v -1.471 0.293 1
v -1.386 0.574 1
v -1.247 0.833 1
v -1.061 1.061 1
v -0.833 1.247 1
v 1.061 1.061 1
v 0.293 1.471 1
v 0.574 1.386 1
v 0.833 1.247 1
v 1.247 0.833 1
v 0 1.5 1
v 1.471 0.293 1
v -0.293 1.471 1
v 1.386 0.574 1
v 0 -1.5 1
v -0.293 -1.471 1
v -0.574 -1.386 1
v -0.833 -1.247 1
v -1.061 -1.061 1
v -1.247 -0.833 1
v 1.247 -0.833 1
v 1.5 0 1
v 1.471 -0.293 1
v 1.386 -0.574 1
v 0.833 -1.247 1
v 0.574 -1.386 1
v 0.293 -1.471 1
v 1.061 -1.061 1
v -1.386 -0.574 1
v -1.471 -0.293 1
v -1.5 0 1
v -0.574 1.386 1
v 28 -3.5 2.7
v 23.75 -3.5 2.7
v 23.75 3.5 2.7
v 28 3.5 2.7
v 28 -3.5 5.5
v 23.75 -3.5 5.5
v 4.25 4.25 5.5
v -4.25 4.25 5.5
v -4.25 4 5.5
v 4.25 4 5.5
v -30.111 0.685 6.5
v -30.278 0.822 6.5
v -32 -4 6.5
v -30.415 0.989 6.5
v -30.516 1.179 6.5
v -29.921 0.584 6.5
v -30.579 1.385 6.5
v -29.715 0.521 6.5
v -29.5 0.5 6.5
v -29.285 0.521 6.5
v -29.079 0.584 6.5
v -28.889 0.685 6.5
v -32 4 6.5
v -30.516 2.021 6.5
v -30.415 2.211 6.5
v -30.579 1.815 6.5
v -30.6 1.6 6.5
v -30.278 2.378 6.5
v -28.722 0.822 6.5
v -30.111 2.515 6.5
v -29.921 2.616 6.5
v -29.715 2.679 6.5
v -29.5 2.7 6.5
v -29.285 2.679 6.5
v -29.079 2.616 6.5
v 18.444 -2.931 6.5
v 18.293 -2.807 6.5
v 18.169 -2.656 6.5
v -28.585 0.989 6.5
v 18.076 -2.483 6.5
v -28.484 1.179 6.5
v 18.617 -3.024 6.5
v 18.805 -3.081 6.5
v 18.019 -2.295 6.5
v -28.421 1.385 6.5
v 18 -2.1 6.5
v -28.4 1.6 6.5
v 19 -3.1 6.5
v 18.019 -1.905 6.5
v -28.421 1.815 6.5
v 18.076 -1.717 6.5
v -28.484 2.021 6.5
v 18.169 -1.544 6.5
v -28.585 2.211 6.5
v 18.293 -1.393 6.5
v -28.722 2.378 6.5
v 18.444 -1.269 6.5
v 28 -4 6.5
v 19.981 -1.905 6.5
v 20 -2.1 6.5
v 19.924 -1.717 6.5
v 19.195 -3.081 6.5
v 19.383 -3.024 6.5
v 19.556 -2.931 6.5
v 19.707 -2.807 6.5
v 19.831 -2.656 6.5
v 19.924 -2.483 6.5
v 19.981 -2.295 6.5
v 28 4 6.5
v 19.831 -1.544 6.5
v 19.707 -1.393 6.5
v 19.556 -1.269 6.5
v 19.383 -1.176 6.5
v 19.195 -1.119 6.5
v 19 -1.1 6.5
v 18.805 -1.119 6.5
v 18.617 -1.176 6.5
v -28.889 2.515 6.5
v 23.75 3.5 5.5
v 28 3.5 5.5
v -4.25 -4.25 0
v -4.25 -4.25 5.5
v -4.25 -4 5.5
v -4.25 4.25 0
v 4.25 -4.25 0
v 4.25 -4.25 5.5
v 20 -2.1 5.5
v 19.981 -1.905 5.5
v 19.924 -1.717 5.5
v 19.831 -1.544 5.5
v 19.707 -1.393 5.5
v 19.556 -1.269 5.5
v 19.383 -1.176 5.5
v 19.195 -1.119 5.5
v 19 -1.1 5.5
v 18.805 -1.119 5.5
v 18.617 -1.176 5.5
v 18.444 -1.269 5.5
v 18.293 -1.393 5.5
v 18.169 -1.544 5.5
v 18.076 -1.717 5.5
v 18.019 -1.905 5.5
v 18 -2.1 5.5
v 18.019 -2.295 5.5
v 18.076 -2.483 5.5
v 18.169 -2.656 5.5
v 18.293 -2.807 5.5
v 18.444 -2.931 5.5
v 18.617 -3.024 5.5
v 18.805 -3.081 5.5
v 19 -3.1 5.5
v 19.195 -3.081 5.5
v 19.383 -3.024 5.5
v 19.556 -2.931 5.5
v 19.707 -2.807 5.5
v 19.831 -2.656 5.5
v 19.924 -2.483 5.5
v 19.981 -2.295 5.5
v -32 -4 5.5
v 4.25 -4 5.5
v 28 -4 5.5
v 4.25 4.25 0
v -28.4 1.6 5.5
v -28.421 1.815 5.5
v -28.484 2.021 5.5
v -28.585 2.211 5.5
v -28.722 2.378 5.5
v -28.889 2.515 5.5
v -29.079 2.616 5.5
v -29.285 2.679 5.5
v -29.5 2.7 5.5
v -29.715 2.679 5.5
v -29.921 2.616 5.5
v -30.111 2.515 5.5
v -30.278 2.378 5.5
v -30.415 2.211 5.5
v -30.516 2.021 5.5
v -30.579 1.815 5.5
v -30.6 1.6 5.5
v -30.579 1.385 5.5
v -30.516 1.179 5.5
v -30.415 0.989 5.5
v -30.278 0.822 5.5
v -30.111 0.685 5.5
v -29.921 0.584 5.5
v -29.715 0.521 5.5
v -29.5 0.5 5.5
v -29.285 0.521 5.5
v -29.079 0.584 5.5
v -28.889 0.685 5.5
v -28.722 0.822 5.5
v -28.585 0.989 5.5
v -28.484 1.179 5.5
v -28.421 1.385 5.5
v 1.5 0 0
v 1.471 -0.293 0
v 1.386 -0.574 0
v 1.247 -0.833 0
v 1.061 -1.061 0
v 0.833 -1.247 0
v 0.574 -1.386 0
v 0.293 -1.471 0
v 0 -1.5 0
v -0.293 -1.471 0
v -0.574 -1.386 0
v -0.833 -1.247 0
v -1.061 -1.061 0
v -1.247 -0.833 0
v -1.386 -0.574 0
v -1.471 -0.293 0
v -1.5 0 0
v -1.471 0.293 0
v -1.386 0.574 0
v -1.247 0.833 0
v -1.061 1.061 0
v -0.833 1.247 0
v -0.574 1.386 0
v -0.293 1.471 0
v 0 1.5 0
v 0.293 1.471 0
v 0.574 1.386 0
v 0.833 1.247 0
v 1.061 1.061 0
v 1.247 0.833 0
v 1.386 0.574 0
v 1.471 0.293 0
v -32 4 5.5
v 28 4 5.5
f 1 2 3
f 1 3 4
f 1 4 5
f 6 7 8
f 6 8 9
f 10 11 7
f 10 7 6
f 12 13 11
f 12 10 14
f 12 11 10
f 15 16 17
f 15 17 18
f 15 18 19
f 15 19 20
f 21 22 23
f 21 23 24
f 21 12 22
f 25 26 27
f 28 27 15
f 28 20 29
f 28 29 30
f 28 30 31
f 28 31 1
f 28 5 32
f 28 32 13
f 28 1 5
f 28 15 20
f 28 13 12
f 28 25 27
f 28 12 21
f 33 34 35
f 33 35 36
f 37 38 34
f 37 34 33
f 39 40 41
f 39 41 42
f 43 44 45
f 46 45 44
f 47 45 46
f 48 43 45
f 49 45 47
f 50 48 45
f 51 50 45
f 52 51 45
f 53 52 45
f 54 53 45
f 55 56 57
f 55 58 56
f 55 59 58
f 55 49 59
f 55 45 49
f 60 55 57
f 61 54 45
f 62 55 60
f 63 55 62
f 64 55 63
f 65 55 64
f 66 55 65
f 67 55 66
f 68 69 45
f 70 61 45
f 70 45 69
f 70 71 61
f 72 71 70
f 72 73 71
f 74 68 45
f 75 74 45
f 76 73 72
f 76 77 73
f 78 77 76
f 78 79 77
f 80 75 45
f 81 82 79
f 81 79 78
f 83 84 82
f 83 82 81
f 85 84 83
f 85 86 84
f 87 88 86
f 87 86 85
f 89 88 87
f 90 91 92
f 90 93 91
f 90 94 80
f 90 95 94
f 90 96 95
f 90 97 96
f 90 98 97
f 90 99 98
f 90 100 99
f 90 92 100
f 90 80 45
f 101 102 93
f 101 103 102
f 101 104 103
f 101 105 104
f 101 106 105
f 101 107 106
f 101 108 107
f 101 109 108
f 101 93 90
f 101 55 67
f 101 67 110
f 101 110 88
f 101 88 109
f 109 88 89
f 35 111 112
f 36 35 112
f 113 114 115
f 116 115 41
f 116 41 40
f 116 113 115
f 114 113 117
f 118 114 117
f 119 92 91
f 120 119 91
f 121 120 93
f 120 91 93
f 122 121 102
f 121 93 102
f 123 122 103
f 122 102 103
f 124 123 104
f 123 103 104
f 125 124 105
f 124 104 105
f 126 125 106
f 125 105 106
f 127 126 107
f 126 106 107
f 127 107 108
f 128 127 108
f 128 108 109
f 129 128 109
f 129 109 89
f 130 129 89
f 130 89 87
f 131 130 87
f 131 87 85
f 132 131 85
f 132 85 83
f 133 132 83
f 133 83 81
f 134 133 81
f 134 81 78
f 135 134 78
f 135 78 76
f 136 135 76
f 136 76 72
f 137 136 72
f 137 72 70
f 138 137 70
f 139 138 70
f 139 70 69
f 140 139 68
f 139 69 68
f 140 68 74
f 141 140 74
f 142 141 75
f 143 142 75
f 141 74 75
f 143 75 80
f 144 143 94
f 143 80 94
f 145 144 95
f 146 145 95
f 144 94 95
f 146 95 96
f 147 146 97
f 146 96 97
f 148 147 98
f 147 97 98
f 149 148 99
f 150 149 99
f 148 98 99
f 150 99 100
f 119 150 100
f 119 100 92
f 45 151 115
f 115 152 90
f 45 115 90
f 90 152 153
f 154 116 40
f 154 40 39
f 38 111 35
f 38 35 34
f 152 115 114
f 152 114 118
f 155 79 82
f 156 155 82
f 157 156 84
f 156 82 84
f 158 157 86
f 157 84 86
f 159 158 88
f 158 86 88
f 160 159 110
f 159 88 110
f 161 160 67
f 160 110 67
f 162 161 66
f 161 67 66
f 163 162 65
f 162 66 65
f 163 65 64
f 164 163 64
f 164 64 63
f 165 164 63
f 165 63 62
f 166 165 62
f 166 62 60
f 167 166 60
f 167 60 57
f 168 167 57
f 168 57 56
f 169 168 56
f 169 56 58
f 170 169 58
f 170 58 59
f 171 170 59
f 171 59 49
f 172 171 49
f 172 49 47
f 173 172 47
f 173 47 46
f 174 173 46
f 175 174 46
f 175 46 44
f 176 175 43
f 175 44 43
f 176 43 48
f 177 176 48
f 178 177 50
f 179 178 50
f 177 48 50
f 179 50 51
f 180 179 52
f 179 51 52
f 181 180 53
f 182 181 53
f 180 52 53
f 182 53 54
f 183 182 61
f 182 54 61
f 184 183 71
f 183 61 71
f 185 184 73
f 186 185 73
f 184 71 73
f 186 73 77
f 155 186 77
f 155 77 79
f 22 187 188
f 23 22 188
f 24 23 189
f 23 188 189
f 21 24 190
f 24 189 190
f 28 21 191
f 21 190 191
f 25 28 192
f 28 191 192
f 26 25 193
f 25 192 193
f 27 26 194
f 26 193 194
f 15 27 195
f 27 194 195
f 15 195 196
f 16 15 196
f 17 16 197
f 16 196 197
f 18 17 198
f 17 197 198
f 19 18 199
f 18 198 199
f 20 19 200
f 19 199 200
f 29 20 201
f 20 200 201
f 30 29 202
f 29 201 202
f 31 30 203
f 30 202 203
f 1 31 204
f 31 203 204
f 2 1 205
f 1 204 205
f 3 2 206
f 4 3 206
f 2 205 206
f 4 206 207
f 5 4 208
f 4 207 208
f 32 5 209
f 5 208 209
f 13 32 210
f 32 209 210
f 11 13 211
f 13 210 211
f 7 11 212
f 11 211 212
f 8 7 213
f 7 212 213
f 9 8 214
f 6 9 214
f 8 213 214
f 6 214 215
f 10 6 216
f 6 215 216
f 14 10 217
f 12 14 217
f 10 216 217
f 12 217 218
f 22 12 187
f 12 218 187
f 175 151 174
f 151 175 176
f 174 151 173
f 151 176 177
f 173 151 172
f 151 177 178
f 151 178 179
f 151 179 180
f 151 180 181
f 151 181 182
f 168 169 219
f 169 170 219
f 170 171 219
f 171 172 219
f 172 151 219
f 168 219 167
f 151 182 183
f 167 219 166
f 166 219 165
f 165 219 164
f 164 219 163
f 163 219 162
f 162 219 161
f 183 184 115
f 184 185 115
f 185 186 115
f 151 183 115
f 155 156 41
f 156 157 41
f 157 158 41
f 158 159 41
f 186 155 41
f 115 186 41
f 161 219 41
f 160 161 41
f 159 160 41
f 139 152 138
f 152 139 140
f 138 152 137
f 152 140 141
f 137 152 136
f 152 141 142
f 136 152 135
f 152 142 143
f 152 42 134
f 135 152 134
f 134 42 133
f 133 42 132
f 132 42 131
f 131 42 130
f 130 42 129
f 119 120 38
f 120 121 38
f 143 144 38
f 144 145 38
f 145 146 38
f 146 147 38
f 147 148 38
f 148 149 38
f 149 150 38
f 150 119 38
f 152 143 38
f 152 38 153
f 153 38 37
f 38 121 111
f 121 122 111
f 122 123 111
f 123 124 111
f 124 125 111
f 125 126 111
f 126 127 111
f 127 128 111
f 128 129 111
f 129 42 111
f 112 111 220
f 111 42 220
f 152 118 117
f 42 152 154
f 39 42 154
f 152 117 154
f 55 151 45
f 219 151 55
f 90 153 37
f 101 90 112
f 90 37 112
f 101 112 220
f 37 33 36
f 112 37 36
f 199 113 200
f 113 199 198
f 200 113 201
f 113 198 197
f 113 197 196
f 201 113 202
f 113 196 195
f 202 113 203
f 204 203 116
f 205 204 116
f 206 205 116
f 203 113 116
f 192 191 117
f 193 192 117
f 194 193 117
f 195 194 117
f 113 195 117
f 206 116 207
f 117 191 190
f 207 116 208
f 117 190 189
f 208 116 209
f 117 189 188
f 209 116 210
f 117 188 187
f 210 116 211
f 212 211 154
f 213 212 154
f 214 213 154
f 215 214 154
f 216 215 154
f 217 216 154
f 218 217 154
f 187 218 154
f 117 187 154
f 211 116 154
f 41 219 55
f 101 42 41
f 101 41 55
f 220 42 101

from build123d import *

# Parameters (mm, degrees)
SKETCH_W        = 8.5
SKETCH_H        = 8.5
PAD_DEPTH       = 5.5
SKETCH001_W     = 60
SKETCH001_H     = 8
PAD001_DEPTH    = 1
SKETCH002_R     = 1
SKETCH002_R_2   = 1.1
POCKET_DEPTH    = 6.501
SKETCH003_W     = 4.25
SKETCH003_H     = 7
PAD002_DEPTH    = 2.8
SKETCH004_R     = 1.5
POCKET001_DEPTH = 1


with BuildPart() as part:
    # Sketch → Pad (new body)
    with BuildSketch(Plane.XY):
        Rectangle(SKETCH_W, SKETCH_H)
    extrude(amount=PAD_DEPTH)

    # Sketch001 → Pad001 (new body)
    with BuildSketch(Plane.XY.offset(5.5)):
        with Locations((-2, 0)):
            Rectangle(SKETCH001_W, SKETCH001_H)
    extrude(amount=PAD001_DEPTH)

    # Sketch002 → Pocket (cut, through all)
    with BuildSketch(Plane.XY.offset(6.5)):
        with Locations((19, -2.1)):
            Circle(SKETCH002_R)
        with Locations((-29.5, 1.6)):
            Circle(SKETCH002_R_2)
    extrude(amount=-POCKET_DEPTH, mode=Mode.SUBTRACT)

    # Sketch003 → Pad002 (new body)
    with BuildSketch(Plane(origin=(0, 0, 5.5), x_dir=(1, 0, 0), z_dir=(0, 0, -1))):
        with Locations((25.875, 0)):
            Rectangle(SKETCH003_W, SKETCH003_H)
    extrude(amount=PAD002_DEPTH)

    # Sketch004 → Pocket001 (cut)
    with BuildSketch(Plane(origin=(0, 0, 0), x_dir=(1, 0, 0), z_dir=(0, 0, -1))):
        Circle(SKETCH004_R)
    extrude(amount=-POCKET001_DEPTH, mode=Mode.SUBTRACT)


solid = part.part
